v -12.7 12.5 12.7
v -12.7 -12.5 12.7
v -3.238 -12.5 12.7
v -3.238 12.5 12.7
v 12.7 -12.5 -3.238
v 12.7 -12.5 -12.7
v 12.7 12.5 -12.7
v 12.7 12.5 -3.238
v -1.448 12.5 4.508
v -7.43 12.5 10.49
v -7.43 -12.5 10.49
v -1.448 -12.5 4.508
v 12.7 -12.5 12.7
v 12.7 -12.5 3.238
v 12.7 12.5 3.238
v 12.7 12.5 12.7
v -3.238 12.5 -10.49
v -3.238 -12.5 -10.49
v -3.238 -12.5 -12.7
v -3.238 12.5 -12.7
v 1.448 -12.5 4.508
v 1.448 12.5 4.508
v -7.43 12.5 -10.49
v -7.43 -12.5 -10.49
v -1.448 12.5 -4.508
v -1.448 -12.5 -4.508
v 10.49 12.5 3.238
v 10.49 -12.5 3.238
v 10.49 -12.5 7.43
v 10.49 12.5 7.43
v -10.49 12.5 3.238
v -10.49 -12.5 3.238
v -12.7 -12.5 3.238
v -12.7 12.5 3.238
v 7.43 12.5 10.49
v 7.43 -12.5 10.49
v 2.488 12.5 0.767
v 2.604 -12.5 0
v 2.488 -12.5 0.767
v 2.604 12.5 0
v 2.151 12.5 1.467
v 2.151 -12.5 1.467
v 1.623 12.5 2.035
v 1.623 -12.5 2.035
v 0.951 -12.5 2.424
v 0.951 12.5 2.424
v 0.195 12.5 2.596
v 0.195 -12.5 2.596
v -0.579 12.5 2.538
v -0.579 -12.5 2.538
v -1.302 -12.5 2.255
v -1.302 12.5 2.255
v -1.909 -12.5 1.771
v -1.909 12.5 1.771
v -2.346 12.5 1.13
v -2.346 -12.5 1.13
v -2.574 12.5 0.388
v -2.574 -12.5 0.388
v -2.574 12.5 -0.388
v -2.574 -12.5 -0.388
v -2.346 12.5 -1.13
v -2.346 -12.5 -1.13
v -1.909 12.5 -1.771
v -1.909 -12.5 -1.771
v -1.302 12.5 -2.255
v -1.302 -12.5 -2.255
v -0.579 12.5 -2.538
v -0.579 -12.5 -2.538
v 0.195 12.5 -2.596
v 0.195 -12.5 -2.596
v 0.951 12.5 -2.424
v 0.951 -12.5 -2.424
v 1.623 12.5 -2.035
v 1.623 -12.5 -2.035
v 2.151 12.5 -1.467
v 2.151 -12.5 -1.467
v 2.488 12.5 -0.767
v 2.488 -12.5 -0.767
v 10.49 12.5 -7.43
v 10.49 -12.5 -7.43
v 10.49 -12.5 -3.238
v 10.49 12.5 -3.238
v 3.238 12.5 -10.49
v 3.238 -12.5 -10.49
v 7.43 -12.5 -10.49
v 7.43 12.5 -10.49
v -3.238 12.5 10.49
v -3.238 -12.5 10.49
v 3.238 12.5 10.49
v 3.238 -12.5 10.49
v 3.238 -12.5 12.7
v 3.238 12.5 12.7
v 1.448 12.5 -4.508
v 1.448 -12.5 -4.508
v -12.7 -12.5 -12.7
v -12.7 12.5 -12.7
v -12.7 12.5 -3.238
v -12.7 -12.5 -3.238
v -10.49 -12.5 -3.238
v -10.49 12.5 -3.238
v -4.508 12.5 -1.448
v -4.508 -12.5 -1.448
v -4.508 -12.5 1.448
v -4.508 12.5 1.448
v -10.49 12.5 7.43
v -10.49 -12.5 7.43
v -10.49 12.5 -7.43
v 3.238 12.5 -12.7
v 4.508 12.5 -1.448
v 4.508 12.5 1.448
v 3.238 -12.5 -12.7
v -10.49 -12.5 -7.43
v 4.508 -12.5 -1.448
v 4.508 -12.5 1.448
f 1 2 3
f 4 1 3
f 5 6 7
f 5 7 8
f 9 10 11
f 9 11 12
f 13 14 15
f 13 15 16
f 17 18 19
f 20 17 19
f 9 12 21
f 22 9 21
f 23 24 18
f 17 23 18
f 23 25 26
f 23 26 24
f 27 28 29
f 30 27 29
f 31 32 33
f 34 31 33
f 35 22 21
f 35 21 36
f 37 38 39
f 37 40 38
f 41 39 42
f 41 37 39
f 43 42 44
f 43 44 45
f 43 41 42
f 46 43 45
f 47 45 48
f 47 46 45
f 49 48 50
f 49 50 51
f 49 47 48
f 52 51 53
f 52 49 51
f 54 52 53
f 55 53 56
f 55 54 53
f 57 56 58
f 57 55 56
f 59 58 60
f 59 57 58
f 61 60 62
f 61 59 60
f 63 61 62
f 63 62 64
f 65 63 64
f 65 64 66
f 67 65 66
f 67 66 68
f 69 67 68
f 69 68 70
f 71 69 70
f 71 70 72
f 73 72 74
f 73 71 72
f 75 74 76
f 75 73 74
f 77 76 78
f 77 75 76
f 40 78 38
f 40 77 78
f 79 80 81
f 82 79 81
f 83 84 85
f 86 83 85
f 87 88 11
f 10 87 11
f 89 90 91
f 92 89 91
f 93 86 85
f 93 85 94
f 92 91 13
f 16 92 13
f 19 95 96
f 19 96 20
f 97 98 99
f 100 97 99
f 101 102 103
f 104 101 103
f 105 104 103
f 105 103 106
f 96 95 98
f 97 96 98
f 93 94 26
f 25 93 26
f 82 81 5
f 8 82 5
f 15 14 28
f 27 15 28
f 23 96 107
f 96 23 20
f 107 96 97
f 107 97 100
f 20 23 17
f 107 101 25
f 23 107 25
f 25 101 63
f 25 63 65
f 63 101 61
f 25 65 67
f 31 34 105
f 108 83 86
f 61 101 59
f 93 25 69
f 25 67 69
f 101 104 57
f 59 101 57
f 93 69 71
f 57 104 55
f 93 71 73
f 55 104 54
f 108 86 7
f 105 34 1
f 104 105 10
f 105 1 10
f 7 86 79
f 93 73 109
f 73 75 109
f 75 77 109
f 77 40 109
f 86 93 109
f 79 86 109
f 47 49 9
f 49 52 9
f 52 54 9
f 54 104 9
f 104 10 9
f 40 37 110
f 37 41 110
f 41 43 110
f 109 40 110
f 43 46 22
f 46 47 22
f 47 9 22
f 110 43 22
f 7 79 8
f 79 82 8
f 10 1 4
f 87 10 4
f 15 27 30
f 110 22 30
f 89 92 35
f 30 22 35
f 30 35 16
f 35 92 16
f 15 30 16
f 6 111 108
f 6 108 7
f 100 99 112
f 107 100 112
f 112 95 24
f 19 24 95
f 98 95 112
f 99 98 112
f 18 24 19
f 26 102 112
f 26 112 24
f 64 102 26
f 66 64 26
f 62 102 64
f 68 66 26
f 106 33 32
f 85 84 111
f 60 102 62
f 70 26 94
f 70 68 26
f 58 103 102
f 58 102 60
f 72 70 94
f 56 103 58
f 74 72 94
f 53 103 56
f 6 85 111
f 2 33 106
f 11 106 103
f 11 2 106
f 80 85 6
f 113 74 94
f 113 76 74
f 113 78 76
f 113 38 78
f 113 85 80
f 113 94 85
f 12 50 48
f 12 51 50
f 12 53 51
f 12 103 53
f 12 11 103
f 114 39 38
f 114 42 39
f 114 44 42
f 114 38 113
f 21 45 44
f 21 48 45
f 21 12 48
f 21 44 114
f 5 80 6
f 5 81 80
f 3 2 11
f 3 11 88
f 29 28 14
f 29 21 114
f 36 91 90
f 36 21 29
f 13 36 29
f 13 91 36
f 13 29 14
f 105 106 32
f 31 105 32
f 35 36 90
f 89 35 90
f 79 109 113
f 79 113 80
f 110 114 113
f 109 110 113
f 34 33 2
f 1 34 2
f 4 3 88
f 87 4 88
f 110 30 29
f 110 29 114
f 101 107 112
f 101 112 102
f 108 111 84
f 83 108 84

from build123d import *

# Parameters (mm, degrees)
F0_W     = 25.4
F0_H     = 25.4
F0_R     = 2.6035
F1_DEPTH = 12.5
F3_DEPTH = 25.001


with BuildPart() as f1:
    # F0 (on Front) → F1 (new body, symmetric)
    with BuildSketch(Plane.XZ):
        Rectangle(F0_W, F0_H)
        Circle(F0_R, mode=Mode.SUBTRACT)
    extrude(amount=F1_DEPTH, both=True)

    # F2 (on face) → F3 (cut, through all)
    with BuildSketch(Plane.XZ.offset(12.5)):
        Polygon((3.2385, 12.7), (-3.2385, 12.7), (-3.2385, 10.4902), (-7.4295, 10.4902), (-1.4478, 4.5085), (1.4478, 4.5085), (7.4295, 10.4902), (3.2385, 10.4902), align=None)
        Polygon((-12.7, 3.2385), (-12.7, -3.2385), (-10.4902, -3.2385), (-10.4902, -7.4295), (-4.5085, -1.4478), (-4.5085, 1.4478), (-10.4902, 7.4295), (-10.4902, 3.2385), align=None)
        Polygon((-3.2385, -12.7), (3.2385, -12.7), (3.2385, -10.4902), (7.4295, -10.4902), (1.4478, -4.5085), (-1.4478, -4.5085), (-7.4295, -10.4902), (-3.2385, -10.4902), align=None)
        Polygon((12.7, -3.2385), (12.7, 3.2385), (10.4902, 3.2385), (10.4902, 7.4295), (4.5085, 1.4478), (4.5085, -1.4478), (10.4902, -7.4295), (10.4902, -3.2385), align=None)
    extrude(amount=-F3_DEPTH, mode=Mode.SUBTRACT)


solid = f1.part
